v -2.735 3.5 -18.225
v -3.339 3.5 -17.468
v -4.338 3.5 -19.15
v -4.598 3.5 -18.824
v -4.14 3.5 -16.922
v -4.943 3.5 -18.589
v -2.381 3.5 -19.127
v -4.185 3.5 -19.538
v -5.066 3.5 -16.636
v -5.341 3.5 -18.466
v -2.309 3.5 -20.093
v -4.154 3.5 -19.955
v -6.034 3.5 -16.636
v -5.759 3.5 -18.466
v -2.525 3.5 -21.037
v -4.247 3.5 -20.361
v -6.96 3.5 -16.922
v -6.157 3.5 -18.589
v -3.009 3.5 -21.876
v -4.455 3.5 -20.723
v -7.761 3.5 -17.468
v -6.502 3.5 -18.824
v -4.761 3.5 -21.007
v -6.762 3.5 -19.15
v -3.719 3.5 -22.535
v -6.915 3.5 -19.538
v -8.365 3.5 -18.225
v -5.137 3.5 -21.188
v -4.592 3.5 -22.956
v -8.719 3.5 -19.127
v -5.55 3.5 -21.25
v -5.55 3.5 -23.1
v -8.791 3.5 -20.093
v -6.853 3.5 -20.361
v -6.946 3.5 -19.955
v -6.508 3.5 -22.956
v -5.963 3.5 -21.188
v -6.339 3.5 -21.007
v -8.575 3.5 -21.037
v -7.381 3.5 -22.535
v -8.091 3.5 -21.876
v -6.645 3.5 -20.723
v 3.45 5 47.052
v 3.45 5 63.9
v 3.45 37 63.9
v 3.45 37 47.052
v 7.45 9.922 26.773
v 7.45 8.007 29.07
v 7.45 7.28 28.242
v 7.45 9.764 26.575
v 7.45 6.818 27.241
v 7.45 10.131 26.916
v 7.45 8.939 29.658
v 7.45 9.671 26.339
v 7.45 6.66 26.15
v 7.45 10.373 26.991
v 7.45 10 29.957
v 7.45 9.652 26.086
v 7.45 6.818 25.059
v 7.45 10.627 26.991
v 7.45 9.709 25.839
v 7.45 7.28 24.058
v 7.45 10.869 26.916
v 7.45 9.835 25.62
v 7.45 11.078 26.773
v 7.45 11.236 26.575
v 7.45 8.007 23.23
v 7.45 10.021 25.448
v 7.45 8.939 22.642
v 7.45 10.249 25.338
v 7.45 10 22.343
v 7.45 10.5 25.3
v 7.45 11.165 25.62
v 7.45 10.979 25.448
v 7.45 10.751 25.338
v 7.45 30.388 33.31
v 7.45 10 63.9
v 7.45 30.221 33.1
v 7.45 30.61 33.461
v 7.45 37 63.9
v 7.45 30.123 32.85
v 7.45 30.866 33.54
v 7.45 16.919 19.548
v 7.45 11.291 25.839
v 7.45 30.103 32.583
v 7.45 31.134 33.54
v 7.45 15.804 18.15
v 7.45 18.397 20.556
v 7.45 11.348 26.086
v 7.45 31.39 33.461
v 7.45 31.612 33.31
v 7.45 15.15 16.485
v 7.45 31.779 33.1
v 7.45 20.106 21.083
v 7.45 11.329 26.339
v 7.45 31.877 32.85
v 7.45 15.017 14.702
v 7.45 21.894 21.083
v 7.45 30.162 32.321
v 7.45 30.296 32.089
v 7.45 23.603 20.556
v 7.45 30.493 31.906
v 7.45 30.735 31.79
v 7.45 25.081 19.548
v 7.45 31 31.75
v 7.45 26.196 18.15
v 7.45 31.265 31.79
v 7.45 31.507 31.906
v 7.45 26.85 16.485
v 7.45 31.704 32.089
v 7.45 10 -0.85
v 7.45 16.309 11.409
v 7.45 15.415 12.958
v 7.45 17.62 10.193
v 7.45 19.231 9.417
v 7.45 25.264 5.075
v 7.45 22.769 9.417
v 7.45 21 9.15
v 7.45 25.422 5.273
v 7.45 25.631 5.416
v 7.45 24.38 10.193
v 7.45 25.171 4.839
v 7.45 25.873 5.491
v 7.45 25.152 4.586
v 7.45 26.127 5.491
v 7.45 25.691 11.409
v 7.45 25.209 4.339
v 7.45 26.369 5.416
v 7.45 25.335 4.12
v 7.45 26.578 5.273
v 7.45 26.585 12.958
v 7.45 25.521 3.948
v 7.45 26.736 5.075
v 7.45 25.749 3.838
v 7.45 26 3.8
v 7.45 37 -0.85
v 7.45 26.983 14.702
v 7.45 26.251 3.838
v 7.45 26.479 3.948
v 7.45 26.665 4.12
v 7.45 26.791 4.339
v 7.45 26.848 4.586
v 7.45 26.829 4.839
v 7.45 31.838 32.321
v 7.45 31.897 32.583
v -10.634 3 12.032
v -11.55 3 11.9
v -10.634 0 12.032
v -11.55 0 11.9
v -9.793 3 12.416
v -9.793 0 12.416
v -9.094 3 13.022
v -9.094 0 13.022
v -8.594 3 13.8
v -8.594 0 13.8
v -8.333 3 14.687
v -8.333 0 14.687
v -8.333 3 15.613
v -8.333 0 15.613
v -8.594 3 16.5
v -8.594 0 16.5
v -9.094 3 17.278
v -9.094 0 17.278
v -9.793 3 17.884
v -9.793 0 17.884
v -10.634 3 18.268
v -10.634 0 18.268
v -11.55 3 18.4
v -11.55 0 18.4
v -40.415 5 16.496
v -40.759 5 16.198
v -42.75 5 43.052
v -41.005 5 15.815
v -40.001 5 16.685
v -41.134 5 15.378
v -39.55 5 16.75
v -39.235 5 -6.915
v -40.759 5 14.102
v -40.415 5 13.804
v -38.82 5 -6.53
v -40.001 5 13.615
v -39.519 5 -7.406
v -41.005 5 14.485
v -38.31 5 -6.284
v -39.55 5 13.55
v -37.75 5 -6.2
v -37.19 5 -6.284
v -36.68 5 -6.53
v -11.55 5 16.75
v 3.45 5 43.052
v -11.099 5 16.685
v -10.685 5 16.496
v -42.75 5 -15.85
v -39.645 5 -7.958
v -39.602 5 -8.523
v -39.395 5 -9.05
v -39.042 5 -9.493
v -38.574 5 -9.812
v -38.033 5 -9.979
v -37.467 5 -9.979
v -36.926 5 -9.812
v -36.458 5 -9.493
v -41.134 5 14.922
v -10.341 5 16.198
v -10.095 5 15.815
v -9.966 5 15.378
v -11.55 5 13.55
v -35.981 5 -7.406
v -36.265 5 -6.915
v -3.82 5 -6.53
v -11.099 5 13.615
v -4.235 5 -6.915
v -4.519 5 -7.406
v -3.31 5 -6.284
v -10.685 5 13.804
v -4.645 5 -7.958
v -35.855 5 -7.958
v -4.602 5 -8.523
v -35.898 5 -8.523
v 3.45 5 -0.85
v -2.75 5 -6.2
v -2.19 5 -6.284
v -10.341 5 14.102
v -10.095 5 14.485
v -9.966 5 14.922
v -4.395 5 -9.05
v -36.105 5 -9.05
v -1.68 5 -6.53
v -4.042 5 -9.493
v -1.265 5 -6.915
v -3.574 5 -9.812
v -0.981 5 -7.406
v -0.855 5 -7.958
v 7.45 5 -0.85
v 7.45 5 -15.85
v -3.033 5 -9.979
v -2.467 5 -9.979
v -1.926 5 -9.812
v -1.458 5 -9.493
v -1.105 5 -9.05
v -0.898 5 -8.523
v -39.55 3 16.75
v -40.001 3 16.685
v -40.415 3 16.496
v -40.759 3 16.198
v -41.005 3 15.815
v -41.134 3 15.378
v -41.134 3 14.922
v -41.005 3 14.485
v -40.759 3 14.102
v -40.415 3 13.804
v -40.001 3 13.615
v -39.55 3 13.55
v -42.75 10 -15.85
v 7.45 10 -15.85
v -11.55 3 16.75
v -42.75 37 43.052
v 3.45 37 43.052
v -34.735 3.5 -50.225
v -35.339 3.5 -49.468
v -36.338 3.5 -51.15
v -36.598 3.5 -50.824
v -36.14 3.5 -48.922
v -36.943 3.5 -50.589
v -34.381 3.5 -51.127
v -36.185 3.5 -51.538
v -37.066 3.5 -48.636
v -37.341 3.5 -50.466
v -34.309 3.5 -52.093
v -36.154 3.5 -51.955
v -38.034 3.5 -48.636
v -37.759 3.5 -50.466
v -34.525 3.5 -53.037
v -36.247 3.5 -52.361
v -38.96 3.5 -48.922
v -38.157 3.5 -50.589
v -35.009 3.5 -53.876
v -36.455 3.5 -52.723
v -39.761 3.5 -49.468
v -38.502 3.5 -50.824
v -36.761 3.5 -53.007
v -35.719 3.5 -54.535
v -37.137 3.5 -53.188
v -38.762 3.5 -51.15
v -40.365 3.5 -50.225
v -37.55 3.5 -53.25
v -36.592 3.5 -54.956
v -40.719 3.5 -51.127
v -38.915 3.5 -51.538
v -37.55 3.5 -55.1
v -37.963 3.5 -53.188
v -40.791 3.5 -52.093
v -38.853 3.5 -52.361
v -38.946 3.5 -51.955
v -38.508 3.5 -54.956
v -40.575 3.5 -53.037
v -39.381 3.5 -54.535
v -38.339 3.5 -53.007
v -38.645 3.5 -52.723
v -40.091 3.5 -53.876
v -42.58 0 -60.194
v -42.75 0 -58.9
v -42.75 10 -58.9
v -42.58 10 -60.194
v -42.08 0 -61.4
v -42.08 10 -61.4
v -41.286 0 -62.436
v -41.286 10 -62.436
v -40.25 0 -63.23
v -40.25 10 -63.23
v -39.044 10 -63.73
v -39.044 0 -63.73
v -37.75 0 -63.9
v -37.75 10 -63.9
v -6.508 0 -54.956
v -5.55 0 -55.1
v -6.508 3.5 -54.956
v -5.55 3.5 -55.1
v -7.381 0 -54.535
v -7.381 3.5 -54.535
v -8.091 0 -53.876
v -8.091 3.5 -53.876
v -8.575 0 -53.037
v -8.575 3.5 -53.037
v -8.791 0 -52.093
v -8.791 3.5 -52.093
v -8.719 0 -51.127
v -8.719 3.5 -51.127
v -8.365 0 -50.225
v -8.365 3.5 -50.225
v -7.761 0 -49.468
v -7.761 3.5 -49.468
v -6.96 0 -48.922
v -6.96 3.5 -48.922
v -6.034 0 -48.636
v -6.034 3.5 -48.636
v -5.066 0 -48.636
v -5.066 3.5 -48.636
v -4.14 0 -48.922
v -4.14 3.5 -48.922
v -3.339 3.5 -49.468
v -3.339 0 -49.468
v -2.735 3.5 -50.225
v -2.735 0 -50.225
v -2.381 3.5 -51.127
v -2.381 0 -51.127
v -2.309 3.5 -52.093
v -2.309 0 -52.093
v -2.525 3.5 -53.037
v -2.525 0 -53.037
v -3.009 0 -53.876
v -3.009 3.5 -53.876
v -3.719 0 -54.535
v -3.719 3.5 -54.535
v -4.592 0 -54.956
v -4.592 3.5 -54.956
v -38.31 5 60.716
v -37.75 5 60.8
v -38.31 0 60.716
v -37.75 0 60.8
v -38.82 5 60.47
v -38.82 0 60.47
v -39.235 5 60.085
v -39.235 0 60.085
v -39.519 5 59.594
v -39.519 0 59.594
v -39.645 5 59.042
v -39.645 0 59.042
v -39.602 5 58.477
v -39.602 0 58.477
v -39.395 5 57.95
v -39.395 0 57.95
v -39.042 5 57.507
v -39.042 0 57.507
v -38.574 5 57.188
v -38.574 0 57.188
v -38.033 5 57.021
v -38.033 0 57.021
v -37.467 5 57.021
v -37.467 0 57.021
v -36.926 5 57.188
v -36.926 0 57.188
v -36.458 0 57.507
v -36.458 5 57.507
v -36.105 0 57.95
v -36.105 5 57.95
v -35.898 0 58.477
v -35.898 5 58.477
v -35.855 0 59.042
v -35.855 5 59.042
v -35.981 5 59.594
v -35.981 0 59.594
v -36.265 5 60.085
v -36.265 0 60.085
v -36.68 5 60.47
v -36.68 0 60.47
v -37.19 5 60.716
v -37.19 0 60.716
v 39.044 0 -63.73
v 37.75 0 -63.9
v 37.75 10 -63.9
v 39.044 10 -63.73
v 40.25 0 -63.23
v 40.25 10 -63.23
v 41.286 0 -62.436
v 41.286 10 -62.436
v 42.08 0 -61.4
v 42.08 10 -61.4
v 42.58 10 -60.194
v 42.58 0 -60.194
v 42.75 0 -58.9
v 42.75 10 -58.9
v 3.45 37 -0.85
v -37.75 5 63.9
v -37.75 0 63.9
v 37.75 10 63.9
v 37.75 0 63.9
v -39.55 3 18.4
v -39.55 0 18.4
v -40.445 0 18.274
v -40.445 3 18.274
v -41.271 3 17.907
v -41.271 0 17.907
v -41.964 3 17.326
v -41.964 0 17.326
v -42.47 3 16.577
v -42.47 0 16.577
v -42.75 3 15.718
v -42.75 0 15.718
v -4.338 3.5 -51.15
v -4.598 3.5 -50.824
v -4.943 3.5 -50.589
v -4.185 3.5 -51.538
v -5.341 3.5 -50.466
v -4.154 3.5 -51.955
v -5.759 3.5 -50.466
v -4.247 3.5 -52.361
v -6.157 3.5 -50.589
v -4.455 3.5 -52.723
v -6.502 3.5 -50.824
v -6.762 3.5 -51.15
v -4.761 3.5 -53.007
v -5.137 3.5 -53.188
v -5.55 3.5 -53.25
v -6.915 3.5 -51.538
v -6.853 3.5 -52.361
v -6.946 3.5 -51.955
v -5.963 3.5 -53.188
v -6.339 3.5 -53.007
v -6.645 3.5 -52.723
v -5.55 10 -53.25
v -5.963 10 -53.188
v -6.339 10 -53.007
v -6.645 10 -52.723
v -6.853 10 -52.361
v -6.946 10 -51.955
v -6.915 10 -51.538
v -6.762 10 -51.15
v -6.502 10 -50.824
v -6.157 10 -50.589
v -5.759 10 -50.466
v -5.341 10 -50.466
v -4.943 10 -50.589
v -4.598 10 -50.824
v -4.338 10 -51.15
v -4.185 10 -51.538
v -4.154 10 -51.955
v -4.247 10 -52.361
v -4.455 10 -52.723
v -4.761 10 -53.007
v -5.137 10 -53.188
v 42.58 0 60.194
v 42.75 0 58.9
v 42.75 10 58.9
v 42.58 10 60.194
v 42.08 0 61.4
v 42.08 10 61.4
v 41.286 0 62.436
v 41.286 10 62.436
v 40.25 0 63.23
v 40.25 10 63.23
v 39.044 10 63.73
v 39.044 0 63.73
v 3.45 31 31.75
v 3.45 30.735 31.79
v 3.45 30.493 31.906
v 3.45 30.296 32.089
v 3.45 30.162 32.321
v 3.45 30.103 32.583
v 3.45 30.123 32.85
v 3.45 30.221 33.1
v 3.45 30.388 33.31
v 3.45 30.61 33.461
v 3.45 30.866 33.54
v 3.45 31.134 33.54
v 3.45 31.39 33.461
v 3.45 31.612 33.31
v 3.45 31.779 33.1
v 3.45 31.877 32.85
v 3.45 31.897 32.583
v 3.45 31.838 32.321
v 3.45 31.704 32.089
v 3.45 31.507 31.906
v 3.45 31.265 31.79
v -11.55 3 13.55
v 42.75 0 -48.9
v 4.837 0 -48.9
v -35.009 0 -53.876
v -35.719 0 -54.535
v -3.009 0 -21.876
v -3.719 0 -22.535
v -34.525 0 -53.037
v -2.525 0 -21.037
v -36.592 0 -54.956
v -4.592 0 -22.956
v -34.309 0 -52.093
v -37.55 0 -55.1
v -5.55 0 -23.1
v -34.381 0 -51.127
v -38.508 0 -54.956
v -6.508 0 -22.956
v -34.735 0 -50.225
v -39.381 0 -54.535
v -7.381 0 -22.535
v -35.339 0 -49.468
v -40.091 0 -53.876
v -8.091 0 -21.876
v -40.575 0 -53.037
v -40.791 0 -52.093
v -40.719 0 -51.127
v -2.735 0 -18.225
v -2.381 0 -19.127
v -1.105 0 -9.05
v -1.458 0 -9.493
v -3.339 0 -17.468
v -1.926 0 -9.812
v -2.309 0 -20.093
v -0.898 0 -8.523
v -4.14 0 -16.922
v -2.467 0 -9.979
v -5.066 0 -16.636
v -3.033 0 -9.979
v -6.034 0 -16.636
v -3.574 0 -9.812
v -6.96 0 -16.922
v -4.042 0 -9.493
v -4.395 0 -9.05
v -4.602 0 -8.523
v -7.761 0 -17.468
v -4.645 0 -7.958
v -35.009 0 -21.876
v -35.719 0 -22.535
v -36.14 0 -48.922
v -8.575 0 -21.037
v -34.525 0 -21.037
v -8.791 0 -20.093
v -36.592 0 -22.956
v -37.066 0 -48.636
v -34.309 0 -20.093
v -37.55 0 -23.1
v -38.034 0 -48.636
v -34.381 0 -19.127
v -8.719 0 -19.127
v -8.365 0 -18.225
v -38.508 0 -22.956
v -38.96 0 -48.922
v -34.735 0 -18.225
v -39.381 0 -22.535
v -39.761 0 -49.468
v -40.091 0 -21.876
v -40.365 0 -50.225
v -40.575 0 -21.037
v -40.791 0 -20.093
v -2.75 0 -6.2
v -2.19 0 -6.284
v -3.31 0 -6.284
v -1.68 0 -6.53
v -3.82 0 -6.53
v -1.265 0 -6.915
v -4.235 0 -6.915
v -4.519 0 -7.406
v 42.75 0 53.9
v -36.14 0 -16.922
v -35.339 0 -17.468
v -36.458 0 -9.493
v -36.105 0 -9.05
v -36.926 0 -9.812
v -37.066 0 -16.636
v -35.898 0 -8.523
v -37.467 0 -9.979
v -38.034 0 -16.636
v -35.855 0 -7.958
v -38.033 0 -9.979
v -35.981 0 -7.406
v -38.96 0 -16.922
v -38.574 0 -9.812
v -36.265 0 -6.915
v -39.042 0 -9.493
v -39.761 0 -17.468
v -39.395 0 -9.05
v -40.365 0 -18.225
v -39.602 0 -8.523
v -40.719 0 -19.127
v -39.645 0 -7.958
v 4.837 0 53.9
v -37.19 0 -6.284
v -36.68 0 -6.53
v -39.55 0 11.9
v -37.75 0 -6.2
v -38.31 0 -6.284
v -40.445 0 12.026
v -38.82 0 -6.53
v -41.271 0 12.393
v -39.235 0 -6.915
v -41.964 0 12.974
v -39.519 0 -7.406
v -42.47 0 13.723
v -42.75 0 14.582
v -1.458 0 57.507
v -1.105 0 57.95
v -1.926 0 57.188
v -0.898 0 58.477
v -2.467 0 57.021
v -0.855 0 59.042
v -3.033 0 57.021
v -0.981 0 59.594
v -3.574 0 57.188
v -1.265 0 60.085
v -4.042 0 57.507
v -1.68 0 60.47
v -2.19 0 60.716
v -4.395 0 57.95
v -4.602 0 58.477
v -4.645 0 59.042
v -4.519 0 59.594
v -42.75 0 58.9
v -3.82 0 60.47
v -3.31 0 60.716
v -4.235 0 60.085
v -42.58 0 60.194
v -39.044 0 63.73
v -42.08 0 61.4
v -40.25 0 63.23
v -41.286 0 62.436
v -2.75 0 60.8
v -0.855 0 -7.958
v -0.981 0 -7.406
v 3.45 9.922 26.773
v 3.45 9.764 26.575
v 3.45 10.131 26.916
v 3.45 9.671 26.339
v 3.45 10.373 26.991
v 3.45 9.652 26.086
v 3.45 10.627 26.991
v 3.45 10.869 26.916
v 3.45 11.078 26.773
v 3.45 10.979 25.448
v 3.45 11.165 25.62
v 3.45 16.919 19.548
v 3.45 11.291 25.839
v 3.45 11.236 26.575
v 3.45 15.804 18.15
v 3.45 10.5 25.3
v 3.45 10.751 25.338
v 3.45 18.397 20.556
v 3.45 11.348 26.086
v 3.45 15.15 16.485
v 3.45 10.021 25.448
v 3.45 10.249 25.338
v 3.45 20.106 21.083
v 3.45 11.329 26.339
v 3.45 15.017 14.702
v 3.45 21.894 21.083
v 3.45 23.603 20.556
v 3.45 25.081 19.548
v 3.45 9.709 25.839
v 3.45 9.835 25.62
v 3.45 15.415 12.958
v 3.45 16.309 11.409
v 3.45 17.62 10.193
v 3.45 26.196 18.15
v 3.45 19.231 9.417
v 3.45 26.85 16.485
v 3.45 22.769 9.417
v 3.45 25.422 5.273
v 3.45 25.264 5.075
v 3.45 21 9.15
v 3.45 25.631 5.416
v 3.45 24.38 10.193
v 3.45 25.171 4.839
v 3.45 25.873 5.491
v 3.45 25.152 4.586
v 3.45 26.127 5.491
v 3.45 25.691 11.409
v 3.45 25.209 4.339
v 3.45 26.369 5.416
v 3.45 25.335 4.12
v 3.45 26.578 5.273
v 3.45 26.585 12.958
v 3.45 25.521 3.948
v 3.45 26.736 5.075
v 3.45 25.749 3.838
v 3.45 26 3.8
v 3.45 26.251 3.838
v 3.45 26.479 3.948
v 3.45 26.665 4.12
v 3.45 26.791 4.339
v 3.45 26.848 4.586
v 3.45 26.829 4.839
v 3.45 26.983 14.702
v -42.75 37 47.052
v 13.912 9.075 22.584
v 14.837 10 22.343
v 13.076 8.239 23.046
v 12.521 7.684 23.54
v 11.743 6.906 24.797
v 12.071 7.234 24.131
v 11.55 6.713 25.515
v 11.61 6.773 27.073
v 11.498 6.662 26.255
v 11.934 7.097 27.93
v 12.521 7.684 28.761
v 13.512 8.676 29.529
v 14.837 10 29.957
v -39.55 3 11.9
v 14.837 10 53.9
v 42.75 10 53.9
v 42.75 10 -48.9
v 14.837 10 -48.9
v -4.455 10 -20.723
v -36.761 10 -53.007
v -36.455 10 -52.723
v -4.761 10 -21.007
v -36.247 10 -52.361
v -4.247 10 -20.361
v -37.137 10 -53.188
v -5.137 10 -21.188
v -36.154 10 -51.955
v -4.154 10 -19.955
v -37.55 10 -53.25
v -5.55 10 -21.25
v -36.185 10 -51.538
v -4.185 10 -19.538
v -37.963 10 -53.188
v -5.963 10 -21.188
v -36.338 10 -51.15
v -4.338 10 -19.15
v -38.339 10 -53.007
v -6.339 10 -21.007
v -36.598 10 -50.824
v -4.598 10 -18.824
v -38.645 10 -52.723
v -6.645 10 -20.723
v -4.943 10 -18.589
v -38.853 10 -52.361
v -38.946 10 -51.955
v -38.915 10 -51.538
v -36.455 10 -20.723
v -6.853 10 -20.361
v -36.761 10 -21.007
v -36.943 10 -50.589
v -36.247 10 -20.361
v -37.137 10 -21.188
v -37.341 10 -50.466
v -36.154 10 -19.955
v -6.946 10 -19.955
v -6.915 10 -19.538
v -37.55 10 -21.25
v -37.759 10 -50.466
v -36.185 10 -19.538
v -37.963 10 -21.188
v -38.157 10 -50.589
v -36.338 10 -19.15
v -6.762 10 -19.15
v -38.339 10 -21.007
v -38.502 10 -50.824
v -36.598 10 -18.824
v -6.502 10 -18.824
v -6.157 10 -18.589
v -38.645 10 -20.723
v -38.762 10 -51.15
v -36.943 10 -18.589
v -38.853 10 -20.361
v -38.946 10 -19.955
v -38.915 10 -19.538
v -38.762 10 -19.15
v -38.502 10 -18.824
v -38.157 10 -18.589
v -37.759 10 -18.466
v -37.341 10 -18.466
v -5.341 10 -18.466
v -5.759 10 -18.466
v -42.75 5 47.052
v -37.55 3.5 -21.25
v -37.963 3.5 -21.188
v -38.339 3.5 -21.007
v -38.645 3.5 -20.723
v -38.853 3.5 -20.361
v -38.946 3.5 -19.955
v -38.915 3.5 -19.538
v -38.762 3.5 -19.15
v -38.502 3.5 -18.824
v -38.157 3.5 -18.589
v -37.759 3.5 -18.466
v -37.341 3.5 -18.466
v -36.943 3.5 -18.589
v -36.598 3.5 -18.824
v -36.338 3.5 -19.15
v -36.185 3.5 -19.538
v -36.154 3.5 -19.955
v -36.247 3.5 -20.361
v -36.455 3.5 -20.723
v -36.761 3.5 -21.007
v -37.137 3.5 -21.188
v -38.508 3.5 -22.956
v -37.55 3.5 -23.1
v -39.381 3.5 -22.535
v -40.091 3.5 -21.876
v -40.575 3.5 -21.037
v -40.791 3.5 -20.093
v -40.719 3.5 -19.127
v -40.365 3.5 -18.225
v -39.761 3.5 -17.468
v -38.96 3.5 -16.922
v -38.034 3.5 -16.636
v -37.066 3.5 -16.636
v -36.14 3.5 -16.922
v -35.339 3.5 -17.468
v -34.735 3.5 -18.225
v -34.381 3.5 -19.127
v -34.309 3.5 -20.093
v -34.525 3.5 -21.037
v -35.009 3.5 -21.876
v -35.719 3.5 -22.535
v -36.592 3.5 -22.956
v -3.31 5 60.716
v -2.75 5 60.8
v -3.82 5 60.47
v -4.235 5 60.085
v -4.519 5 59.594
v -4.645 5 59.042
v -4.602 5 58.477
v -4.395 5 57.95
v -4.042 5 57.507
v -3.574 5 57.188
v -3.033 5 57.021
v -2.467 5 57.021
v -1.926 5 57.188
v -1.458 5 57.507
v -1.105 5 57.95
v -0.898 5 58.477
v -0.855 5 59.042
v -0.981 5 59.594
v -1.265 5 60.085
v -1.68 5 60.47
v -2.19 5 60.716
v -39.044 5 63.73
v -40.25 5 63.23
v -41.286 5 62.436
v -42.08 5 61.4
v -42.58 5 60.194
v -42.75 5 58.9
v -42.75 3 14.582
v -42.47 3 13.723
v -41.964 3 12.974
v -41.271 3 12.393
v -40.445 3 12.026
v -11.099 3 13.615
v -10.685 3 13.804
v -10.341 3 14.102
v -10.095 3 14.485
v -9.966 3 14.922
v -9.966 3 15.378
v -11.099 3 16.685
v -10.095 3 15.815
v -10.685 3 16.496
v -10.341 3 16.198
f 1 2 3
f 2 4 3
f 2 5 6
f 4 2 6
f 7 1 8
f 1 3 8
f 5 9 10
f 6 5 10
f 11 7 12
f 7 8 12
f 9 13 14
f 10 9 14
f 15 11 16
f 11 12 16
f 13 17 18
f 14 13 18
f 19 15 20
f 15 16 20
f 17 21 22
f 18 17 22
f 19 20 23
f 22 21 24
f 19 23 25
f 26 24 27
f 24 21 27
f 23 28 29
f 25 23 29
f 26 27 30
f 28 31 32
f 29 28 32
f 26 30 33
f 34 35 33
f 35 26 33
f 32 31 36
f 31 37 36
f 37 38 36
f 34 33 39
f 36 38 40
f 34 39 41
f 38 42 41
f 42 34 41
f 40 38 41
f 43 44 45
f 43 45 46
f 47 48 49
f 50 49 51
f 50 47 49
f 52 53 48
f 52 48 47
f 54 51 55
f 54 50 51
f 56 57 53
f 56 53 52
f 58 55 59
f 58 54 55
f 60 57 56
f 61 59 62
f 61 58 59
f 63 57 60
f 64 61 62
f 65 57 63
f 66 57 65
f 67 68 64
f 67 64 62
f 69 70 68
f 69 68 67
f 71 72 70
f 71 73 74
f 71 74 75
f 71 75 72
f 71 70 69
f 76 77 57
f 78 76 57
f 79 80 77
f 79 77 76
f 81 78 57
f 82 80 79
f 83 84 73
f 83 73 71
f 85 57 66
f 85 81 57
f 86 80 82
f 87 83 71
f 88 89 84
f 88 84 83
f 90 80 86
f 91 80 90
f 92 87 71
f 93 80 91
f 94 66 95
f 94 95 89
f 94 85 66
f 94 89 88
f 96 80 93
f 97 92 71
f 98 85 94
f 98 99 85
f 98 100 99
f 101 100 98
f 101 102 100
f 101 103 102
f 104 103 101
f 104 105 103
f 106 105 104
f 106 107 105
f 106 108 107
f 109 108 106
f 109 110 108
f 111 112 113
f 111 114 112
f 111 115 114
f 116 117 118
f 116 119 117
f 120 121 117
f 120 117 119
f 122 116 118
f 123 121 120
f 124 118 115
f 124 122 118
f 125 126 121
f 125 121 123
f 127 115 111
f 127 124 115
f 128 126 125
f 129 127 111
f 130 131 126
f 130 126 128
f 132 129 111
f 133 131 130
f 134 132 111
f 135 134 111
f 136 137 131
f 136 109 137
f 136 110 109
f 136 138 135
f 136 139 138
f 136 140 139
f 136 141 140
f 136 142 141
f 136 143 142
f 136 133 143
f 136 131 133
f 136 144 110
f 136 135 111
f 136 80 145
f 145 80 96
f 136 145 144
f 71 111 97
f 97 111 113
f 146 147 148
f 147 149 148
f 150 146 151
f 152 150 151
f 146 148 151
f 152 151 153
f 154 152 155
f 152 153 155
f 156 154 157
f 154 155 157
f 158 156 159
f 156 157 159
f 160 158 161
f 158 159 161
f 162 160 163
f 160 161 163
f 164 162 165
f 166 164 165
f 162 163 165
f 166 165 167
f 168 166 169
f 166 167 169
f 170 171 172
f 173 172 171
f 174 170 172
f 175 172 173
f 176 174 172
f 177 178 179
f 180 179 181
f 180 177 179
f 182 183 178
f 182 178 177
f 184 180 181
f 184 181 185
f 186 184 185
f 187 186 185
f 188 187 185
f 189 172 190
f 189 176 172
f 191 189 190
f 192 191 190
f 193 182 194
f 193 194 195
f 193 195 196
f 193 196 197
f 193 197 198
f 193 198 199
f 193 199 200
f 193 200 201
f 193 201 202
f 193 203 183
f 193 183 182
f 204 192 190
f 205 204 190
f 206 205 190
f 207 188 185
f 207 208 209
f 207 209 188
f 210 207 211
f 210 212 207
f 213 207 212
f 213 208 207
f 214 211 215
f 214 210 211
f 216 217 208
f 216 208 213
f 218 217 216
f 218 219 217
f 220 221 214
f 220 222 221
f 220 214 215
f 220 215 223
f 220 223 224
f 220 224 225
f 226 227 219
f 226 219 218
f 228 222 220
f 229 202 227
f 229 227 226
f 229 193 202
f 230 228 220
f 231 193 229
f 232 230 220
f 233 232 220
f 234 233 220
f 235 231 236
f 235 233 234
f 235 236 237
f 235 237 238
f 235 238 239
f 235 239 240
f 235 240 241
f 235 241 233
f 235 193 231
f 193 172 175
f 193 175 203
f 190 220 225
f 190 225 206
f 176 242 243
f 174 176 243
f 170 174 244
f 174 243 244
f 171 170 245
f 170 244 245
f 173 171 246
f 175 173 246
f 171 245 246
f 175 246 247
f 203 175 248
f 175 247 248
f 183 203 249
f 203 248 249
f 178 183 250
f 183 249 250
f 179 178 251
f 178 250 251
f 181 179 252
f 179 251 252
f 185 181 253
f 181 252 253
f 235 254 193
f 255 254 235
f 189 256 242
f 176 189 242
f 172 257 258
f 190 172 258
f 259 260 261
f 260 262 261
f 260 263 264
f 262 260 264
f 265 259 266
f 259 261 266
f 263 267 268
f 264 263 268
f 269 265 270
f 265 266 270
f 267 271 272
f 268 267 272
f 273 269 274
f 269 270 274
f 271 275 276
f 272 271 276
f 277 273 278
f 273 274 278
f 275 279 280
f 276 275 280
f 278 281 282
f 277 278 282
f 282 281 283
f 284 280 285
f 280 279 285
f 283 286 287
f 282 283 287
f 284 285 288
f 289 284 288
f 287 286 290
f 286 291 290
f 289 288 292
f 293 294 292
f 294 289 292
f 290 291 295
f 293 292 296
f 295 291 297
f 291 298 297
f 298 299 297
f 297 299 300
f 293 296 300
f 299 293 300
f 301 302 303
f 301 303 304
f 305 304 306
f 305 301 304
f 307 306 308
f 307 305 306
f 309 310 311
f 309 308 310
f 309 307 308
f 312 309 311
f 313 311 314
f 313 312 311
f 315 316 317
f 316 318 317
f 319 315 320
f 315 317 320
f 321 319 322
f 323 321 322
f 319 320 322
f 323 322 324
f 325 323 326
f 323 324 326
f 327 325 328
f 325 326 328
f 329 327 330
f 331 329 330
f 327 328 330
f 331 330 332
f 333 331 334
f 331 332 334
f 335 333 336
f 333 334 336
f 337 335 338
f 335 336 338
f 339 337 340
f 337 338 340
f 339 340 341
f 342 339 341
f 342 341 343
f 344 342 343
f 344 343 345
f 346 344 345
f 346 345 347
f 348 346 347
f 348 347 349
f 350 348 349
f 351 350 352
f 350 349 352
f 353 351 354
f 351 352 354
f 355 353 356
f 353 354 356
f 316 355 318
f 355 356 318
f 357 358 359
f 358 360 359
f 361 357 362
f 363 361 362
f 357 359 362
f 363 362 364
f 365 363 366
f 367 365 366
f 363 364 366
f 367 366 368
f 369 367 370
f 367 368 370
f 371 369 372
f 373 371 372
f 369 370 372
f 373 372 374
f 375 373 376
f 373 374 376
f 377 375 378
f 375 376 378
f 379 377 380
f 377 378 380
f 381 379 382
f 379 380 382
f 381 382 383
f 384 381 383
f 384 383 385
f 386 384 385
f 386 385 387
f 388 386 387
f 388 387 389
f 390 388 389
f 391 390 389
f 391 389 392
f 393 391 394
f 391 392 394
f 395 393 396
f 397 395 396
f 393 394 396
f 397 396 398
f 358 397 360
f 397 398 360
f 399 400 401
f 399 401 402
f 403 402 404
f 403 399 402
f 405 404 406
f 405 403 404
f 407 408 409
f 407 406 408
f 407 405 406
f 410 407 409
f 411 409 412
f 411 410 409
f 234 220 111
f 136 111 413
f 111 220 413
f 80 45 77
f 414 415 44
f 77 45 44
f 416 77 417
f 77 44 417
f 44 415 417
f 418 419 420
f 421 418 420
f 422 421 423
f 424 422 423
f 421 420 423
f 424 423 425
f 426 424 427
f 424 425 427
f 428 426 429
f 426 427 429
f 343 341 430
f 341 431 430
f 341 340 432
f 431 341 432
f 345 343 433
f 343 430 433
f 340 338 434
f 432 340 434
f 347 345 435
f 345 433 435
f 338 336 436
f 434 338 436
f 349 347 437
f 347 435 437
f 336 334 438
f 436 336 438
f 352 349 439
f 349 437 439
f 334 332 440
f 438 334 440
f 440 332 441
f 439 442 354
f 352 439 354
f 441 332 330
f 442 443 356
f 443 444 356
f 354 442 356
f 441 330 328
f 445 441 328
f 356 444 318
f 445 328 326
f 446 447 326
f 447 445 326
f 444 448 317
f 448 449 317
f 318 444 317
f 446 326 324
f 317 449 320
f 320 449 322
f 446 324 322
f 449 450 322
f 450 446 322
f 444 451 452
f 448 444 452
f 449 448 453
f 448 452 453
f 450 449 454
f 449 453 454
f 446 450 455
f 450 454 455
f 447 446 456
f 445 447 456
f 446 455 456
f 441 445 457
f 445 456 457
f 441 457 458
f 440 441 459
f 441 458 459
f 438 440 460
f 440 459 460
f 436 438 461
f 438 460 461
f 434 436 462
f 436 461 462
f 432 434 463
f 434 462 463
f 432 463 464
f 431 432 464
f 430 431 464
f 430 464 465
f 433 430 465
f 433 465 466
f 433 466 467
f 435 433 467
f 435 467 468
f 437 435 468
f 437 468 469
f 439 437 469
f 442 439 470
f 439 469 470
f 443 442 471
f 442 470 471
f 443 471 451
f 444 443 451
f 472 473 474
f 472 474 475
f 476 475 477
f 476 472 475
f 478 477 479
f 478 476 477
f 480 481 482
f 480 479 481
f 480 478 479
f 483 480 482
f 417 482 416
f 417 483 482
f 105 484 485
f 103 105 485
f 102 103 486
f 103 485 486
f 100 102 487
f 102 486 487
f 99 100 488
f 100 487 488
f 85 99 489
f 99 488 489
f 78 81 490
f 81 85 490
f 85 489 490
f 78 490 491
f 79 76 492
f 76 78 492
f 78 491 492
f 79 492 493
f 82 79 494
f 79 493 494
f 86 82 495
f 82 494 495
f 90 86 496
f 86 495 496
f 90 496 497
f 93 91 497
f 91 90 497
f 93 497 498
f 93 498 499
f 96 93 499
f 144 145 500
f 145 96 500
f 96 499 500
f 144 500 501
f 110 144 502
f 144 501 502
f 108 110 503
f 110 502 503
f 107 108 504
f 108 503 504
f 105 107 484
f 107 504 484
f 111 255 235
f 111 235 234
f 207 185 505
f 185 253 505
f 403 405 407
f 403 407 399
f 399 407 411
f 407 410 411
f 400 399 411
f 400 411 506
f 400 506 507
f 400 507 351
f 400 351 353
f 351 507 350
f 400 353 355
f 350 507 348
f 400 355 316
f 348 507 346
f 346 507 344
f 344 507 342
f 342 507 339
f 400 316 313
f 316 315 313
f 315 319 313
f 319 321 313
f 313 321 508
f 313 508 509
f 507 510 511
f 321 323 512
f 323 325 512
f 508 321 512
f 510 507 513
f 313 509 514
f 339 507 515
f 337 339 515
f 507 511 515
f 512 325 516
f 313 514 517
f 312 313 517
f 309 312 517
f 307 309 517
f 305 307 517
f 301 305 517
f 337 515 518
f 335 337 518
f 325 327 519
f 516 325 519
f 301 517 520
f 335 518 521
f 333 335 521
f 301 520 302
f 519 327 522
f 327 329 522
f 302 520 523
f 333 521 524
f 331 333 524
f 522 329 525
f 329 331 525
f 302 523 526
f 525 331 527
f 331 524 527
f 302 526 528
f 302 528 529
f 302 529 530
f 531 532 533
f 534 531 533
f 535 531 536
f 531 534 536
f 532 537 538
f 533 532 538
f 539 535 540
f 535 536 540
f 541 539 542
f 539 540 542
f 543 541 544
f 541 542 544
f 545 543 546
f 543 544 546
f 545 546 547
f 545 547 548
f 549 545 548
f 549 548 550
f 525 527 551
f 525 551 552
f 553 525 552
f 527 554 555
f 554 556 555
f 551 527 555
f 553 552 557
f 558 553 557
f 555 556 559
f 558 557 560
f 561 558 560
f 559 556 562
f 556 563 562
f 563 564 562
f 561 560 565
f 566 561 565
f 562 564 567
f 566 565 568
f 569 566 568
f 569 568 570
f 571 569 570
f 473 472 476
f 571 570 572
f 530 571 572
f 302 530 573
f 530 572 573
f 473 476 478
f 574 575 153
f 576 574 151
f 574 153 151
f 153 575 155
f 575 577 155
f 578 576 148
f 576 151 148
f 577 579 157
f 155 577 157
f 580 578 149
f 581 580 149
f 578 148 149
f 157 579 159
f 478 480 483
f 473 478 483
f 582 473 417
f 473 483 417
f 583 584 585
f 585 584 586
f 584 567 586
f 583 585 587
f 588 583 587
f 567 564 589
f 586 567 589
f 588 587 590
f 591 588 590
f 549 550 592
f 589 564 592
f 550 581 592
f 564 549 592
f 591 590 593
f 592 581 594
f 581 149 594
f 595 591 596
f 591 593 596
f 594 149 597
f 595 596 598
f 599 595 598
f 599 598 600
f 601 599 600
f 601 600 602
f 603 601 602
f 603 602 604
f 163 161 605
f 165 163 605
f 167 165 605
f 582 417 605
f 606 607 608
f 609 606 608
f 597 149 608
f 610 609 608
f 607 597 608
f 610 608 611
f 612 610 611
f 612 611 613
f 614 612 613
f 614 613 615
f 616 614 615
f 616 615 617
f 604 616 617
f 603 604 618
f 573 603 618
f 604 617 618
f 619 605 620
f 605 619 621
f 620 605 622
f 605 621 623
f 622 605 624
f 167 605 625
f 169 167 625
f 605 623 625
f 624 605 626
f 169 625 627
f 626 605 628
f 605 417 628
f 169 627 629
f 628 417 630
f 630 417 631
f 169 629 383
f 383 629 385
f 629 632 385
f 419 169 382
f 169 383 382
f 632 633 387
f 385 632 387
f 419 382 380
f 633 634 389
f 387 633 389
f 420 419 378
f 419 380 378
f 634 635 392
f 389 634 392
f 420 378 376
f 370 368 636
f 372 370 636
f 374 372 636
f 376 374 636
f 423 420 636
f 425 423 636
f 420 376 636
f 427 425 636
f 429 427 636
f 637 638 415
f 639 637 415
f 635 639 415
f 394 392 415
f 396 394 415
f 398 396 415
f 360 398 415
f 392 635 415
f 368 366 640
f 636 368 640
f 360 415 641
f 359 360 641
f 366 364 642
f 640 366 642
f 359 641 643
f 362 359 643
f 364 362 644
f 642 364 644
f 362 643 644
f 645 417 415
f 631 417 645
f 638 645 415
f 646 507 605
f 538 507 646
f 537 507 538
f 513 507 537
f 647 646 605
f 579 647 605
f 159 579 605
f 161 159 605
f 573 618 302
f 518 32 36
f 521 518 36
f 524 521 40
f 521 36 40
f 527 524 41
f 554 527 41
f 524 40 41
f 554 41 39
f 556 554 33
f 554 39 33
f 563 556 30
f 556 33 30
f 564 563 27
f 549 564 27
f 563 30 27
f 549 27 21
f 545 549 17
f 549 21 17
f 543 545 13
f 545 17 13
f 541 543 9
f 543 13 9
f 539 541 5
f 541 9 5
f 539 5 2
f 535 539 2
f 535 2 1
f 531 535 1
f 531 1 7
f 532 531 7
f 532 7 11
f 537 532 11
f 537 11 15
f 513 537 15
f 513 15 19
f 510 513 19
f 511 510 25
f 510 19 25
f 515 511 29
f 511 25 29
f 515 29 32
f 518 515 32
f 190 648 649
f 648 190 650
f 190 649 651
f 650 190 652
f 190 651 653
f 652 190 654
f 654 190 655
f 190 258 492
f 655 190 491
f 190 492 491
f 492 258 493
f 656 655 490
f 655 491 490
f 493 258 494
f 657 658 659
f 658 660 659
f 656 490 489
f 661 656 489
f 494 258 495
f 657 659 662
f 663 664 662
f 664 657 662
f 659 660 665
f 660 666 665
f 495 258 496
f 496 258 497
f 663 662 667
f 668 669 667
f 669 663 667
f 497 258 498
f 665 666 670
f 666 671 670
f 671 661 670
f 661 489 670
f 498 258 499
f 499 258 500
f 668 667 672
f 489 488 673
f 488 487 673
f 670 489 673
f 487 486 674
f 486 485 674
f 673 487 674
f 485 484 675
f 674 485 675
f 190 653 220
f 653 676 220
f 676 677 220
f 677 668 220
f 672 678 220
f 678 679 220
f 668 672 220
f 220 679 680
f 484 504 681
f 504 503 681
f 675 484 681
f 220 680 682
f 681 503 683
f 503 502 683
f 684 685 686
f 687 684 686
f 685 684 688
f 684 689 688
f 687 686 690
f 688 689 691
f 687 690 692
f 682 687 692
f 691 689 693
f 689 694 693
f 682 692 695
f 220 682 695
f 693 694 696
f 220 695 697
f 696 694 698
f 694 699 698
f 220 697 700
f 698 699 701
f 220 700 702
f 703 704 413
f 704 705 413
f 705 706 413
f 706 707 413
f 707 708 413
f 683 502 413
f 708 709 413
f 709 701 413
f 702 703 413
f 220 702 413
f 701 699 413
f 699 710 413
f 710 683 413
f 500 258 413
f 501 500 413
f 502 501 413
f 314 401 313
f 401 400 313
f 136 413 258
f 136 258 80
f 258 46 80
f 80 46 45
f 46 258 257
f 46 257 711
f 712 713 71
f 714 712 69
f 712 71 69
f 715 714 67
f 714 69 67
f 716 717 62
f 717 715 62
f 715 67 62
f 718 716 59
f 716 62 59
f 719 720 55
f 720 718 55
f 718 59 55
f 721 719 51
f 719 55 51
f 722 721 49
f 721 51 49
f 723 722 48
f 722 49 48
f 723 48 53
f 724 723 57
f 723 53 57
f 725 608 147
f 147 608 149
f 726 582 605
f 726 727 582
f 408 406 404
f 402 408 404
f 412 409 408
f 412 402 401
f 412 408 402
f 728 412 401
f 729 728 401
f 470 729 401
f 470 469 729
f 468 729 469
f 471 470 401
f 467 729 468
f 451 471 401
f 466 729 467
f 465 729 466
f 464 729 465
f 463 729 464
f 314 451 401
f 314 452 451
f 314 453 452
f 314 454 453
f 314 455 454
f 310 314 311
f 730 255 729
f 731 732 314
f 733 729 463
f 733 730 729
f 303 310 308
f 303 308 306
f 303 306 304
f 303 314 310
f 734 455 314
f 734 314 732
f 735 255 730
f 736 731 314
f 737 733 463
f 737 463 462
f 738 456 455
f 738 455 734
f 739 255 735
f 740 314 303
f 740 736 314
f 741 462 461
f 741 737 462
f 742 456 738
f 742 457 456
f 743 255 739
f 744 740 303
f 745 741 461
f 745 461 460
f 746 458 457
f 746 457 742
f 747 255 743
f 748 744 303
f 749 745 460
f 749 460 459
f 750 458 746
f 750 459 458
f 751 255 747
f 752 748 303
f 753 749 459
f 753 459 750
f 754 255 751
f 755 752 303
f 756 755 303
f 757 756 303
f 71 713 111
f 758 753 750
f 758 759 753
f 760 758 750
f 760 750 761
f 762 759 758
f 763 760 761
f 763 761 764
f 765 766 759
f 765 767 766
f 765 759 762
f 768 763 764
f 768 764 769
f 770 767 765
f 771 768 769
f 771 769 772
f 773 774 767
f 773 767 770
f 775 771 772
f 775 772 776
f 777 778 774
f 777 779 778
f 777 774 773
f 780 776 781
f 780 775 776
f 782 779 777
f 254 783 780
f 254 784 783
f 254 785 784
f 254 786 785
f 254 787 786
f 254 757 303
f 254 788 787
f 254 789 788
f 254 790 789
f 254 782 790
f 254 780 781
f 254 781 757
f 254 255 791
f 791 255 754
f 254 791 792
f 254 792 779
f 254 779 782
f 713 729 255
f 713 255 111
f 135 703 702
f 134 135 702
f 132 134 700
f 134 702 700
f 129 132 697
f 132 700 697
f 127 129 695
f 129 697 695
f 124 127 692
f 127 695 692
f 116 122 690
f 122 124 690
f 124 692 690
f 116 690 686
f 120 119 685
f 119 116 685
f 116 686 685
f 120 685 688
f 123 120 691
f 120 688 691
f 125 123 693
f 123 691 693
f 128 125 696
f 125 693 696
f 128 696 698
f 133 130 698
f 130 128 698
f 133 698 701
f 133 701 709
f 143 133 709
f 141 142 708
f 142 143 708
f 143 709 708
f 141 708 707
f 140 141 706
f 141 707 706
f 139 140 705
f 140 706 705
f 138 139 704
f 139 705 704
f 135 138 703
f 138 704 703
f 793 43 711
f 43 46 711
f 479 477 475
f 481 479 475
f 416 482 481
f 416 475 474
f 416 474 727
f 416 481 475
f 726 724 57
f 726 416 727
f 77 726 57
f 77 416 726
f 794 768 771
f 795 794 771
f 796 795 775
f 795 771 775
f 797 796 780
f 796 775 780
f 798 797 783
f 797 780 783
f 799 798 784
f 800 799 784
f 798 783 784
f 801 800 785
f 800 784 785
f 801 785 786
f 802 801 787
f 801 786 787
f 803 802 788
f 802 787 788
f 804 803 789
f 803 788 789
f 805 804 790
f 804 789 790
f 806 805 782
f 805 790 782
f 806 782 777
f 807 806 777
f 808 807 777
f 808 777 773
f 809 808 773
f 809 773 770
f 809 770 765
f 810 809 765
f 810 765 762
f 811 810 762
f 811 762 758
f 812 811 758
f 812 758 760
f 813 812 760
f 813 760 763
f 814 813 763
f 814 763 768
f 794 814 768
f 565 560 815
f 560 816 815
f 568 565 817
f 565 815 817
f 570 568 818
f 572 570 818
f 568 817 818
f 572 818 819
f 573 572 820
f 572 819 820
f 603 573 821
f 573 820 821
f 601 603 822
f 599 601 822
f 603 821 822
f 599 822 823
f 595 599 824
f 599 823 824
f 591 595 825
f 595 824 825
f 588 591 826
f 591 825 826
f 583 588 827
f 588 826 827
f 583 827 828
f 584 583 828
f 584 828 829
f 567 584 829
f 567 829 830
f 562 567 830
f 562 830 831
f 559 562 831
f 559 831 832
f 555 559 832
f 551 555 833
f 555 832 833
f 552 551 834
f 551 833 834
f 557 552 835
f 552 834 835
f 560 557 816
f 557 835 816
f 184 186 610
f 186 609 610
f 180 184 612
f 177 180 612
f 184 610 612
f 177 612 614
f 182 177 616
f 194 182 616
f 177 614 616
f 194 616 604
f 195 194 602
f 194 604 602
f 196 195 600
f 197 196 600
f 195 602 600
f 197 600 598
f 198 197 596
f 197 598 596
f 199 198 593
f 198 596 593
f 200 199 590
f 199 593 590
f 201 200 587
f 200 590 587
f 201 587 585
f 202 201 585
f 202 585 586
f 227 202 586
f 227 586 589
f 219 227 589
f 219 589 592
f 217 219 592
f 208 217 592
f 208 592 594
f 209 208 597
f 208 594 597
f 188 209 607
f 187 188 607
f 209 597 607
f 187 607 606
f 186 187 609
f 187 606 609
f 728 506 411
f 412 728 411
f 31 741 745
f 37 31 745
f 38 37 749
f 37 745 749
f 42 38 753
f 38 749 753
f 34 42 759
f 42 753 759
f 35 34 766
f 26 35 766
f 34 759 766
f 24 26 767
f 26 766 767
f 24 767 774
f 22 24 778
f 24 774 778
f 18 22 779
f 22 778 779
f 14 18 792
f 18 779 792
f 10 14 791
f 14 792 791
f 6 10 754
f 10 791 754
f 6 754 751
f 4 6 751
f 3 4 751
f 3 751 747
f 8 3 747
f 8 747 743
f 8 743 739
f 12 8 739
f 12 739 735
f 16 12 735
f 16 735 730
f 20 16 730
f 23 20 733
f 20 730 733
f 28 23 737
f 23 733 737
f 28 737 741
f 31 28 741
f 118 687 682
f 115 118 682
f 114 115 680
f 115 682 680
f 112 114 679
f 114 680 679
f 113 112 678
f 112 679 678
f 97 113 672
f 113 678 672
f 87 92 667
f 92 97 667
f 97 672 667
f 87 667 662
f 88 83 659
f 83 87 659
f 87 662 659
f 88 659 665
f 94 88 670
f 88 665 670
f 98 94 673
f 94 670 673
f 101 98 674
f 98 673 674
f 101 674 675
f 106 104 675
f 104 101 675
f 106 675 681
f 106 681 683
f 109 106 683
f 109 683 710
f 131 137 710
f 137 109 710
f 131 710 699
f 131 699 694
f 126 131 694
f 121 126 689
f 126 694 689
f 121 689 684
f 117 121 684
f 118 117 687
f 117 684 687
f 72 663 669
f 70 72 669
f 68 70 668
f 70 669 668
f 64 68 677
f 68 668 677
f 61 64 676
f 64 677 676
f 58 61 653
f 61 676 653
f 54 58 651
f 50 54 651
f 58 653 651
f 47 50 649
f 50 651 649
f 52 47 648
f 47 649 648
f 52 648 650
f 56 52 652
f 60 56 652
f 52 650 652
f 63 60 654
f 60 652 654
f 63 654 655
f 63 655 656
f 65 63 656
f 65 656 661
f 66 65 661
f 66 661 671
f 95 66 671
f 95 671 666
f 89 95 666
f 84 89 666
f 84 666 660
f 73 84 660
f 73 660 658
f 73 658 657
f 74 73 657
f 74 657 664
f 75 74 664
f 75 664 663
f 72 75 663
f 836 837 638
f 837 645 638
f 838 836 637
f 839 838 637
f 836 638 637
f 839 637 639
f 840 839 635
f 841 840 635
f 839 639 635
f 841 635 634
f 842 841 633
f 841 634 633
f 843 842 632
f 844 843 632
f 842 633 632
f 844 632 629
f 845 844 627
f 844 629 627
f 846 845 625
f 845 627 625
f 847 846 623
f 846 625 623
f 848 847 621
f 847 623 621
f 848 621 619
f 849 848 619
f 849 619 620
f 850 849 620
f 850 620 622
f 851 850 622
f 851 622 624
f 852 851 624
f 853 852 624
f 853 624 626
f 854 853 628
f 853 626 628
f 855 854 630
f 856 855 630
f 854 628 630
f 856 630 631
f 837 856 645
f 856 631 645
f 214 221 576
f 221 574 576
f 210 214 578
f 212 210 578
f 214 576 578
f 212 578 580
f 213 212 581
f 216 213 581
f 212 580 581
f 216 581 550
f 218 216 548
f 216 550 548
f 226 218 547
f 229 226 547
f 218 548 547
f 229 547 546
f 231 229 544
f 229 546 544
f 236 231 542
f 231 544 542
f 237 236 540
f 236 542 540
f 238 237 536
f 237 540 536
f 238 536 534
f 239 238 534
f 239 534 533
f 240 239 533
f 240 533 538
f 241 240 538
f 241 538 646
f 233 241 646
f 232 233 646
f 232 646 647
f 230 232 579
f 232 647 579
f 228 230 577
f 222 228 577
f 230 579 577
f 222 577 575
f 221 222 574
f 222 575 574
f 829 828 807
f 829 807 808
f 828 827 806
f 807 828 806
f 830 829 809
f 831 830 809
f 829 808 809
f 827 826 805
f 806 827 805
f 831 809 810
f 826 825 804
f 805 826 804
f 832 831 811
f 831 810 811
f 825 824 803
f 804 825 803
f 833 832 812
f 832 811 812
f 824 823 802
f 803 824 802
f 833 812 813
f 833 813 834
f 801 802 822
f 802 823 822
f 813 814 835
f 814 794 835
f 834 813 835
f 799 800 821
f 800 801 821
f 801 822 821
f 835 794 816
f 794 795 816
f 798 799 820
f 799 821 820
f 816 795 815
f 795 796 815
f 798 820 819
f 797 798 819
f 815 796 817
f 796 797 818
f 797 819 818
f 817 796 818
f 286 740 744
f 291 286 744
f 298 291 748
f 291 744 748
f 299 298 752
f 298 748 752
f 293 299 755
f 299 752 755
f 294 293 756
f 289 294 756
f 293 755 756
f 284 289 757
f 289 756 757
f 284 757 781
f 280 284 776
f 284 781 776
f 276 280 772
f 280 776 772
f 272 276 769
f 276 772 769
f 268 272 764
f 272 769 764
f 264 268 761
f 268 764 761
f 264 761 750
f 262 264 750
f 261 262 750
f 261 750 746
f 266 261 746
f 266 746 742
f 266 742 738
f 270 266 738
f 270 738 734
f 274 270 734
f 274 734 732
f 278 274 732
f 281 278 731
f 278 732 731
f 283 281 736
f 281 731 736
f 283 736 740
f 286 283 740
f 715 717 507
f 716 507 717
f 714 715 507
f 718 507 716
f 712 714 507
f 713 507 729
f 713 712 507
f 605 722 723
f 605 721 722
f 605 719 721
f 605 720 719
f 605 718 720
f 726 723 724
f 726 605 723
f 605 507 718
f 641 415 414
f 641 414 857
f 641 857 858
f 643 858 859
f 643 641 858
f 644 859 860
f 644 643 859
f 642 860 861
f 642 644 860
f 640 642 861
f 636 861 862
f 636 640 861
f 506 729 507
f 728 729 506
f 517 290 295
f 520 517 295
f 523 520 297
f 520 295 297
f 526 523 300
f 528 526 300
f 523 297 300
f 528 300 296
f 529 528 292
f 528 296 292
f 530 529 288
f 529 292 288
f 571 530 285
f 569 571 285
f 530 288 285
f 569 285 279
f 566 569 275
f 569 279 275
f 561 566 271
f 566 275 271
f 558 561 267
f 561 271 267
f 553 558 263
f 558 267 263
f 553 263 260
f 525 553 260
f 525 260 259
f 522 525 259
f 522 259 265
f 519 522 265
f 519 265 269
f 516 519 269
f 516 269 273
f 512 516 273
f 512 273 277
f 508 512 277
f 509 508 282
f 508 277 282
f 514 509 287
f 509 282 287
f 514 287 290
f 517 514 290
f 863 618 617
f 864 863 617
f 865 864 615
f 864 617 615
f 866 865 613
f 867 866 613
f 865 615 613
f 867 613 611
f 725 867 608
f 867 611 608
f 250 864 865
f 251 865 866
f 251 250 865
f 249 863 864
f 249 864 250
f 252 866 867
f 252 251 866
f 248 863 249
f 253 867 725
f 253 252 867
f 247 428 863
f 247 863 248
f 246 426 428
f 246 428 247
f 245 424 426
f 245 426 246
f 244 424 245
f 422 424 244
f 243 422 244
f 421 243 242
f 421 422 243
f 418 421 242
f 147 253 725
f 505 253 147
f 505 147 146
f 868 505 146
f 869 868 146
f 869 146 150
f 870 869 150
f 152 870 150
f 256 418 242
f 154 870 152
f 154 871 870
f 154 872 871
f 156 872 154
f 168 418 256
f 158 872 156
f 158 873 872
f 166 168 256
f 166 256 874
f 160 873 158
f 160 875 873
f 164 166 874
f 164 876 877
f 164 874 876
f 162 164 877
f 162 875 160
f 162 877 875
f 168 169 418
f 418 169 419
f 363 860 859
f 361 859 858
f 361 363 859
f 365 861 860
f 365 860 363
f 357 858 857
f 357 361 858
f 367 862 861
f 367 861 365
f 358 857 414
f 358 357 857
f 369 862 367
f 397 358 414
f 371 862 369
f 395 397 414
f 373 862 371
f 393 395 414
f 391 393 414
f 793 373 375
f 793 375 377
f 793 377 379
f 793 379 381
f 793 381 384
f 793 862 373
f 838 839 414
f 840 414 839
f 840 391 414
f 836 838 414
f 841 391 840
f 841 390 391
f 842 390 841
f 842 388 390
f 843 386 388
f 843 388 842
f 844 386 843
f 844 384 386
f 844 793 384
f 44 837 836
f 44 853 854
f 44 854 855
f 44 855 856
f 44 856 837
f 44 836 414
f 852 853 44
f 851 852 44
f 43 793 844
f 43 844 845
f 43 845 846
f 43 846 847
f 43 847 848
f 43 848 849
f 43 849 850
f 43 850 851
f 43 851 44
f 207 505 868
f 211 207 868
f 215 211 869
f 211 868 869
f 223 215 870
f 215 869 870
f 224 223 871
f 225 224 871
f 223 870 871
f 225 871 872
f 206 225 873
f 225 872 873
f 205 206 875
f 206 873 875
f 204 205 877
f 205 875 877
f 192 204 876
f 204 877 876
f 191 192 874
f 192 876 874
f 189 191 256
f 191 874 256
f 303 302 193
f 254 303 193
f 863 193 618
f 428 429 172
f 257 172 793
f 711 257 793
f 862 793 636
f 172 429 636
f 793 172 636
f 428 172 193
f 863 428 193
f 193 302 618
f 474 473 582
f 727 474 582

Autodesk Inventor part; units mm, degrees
ref_plane "Arbeitsebene4" through (-41.55, 10, -74.35) normal (0, -1, 0) x (1, 0, 0)
sketch "Skizze1" plane through (0, 0, 0) normal (0, 1, 0) x (-1, 0, 0)
  line L0 (-37.75, -63.9) -> (37.75, -63.9)
  line L1 (42.75, -58.9) -> (42.75, 58.9)
  line L2 (37.75, 63.9) -> (-37.75, 63.9)
  line L3 (-42.75, 58.9) -> (-42.75, -58.9)
  line L4 (-42.75, -63.9) -> (42.75, 63.9) construction
  line L5 (42.75, -63.9) -> (-42.75, 63.9) construction
  arc A0 (42.75, 58.9) -> (37.75, 63.9) centre (37.75, 58.9) ccw
  arc A1 (-37.75, 63.9) -> (-42.75, 58.9) centre (-37.75, 58.9) ccw
  arc A2 (-42.75, -58.9) -> (-37.75, -63.9) centre (-37.75, -58.9) ccw
  arc A3 (37.75, -63.9) -> (42.75, -58.9) centre (37.75, -58.9) ccw
  point P0 (0, 0)
  dimension "d0" = 85.5
  dimension "d1" = 127.8
  dimension "d2" = 5
extrude "Extrusion1" add sketch "Skizze1" along normal up to surface (10 mm away)
ref_plane "Arbeitsebene1" through (37.75, 0, 0) normal (0, 0, -1) x (-1, 0, 0)
ref_plane "Arbeitsebene2" through (0, 0, 58.9) normal (1, 0, 0) x (0, 0, -1)
sketch "Skizze10" plane through (0, 0, 0) normal (0, -1, 0) x (1, 0, 0)
  circle A0 centre (-37.55, -51.85) radius 1.75 projected
  circle A1 centre (-37.55, -19.85) radius 1.75 projected
  circle A2 centre (-5.55, -51.85) radius 1.75 projected
  circle A3 centre (-5.55, -19.85) radius 1.75 projected
  circle A4 centre (-37.55, -51.85) radius 1.4
  point P0 (0, 0)
  dimension "d37" = 2.8
hole "Bohrung2" at (-37.55, 0, -51.85) at (-37.55, 0, -19.85) at (-5.55, 0, -19.85) at (-5.55, 0, -51.85) direction (0, 1, 0) diameter 2.8 end through all counterbore diameter 6.5 counterbore depth 3.5
sketch "Skizze11" plane through (-37.75, 10, -63.9) normal (0, 1, 0) x (1, 0, 0)
  line L0 (-6.8, -63.05) -> (41.2, -63.05) projected
  line L1 (-6.8, -95.05) -> (41.2, -95.05) projected
  line L2 (-3.8, -48.05) -> (36.2, -48.05) projected
  line L3 (-5, -5) -> (-5, -122.8) projected
  line L4 (0, -127.8) -> (75.5, -127.8) projected
  line L5 (-5, -48.05) -> (45.2, -48.05)
  line L6 (45.2, -48.05) -> (45.2, -127.8)
  line L7 (45.2, -127.8) -> (-5, -127.8)
  line L8 (-5, -127.8) -> (-5, -48.05)
  line L9 (45.2, -108.7984) -> (45.2, -60.5539)
  line L10 (80.5, -82.3) -> (60.5, -82.3) construction
  line L11 (60.5, -82.3) -> (60.5, -82.05) construction
  line L12 (60.5, -82.05) -> (60.5, -81.8) construction
  line L13 (60.5, -81.8) -> (60.5, -81.55) construction
  line L14 (60.5, -81.55) -> (60.5, -81.3) construction
  line L15 (60.5, -81.3) -> (60.5, -81.05) construction
  line L16 (60.5, -81.05) -> (60.5, -80.8) construction
  line L17 (60.5, -80.8) -> (60.5, -80.55) construction
  line L18 (60.5, -80.55) -> (60.5, -80.3) construction
  line L19 (60.5, -80.3) -> (60.5, -80.05) construction
  line L20 (60.5, -80.05) -> (60.5, -79.8) construction
  line L21 (60.5, -79.8) -> (60.5, -79.55) construction
  line L22 (60.5, -79.55) -> (60.5, -79.3) construction
  line L23 (60.5, -79.3) -> (60.5, -79.05) construction
  line L24 (60.5, -79.05) -> (60.5, -78.8) construction
  line L25 (60.5, -78.8) -> (60.5, -78.55) construction
  line L26 (60.5, -78.55) -> (60.5, -78.3) construction
  line L27 (60.5, -78.3) -> (60.5, -78.05) construction
  line L28 (60.5, -78.05) -> (60.5, -77.8) construction
  line L29 (60.5, -77.8) -> (60.5, -77.55) construction
  line L30 (60.5, -77.55) -> (60.5, -77.3) construction
  line L31 (60.5, -77.3) -> (80.5, -77.3) construction
  line L32 (80.5, -77.3) -> (80.5, -41.8) construction
  line L33 (80.5, -41.8) -> (54.7, -41.8) construction
  line L34 (54.7, -41.8) -> (54.7, -117.8) construction
  line L35 (54.7, -117.8) -> (80.5, -117.8) construction
  line L36 (80.5, -117.8) -> (80.5, -82.3) construction
  point P0 (37.75, -63.9)
  dimension "d45" = 0
ref_plane "Arbeitsebene5" through (-44.55, 5, -0.85) normal (0, -1, 0) x (1, 0, 0)
extrude "Extrusion9" cut sketch "Skizze11" against normal up to surface (5 mm away)
sketch "Skizze12" plane through (0, 0, 0) normal (0, -1, 0) x (1, 0, 0)
  circle A0 centre (-39.55, 15.15) radius 1.4 projected
  circle A1 centre (-11.55, 15.15) radius 1.4 projected
  line L0 (-11.55, 15.15) -> (-39.55, 15.15) construction
  line L1 (-11.55, 16.75) -> (-39.55, 16.75)
  line L2 (-39.55, 13.55) -> (-11.55, 13.55)
  arc A2 (-11.55, 13.55) -> (-11.55, 16.75) centre (-11.55, 15.15) ccw
  arc A3 (-39.55, 16.75) -> (-39.55, 13.55) centre (-39.55, 15.15) ccw
  point P0 (0, 0)
  point P1 (-25.55, 15.15)
  dimension "d48" = 3.2
extrude "Extrusion10" cut sketch "Skizze12" against normal blind 10 contours A0 | A1 | A2 L2 A3 L1
sketch "Skizze13" plane through (0, 0, 0) normal (0, -1, 0) x (1, 0, 0)
  line L0 (-44.55, 31.15) -> (3.45, 31.15) projected
  line L1 (-11.55, 13.55) -> (-39.55, 13.55) projected
  arc A0 (-39.55, 16.75) -> (-39.55, 13.55) centre (-39.55, 15.15) ccw projected
  line L2 (-39.55, 16.75) -> (-11.55, 16.75) projected
  arc A1 (-11.55, 13.55) -> (-11.55, 16.75) centre (-11.55, 15.15) ccw projected
  arc A2 (-42.75, -58.9) -> (-37.75, -63.9) centre (-37.75, -58.9) ccw projected
  line L3 (37.75, -63.9) -> (-37.75, -63.9) projected
  arc A3 (37.75, -63.9) -> (42.75, -58.9) centre (37.75, -58.9) ccw projected
  line L4 (42.75, 58.9) -> (42.75, -58.9) projected
  arc A4 (42.75, 58.9) -> (37.75, 63.9) centre (37.75, 58.9) ccw projected
  line L5 (-37.75, 63.9) -> (37.75, 63.9) projected
  arc A5 (-37.75, 63.9) -> (-42.75, 58.9) centre (-37.75, 58.9) ccw projected
  line L6 (-42.75, -58.9) -> (-42.75, 58.9) projected
  line L7 (-11.55, 18.4) -> (-39.55, 18.4)
  arc A6 (-39.55, 18.4) -> (-39.55, 11.9) centre (-39.55, 15.15) ccw
  line L8 (-39.55, 11.9) -> (-11.55, 11.9)
  arc A7 (-11.55, 11.9) -> (-11.55, 18.4) centre (-11.55, 15.15) ccw
  point P0 (0, 0)
  dimension "d51" = 6.5
extrude "Extrusion11" cut sketch "Skizze13" against normal blind 3 contours L1 A0 L2 A1 | A6 L6 | L6 A6 L7 A7 L8
ref_plane "Arbeitsebene6" through (3.45, 21, 15.15) normal (1, 0, 0) x (0, 0, -1)
sketch "Skizze14" plane through (3.45, 21, 15.15) normal (1, 0, 0) x (0, 0, -1)
  line L0 (16, 16) -> (14, 16) projected
  line L1 (16, -16) -> (16, 16) projected
  line L2 (-16, 16) -> (-16, -16) projected
  circle A0 centre (-17.5, 10) radius 1 construction
  circle A1 centre (-11, -10.5) radius 1 construction
  line L3 (9.4, -16) -> (6.6, -16) projected
  circle A2 centre (10.5, 5) radius 1 construction
  circle A3 centre (0, 0) radius 6 projected
  line L4 (-48.75, -21) -> (-48.75, -11) projected
  line L5 (16, 16) -> (-48.75, 16)
  line L6 (-48.75, 16) -> (-48.75, -16)
  line L7 (-48.75, -16) -> (16, -16)
  line L8 (16, -16) -> (16, 16)
  circle A4 centre (-17.5, 10) radius 0.9
  circle A5 centre (10.5, 5) radius 0.85
  circle A6 centre (-11, -10.5) radius 0.85
  point P0 (15.15, -21)
  point P1 (9.4, -16)
  point P2 (16, -16)
  point P3 (14, 16)
  point P4 (-48.75, -11)
  point P5 (6.6, -16)
  dimension "d56" = 1.8
  dimension "d57" = 1.7
  dimension "d58" = 1.7
ref_plane "Arbeitsebene7" through (7.45, -0.1921, -3.518) normal (-1, 0, 0) x (0, -0.417504, 0.9086751)
extrude "Extrusion12" add sketch "Skizze14" along normal up to surface (4 mm away)
sketch "Skizze15" plane through (-37.75, 10, -63.9) normal (0, 1, 0) x (1, 0, 0)
  line L0 (-5, -48.05) -> (45.2, -48.05) projected
  line L1 (45.2, -48.05) -> (45.2, -63.05) projected
  line L2 (45.2, -63.05) -> (45.2, -89.3626) projected
  line L3 (45.2, -89.3626) -> (45.2, -90.7374) projected
  line L4 (45.2, -90.7374) -> (45.2, -127.8) projected
  line L5 (45.2, -127.8) -> (75.5, -127.8) projected
  arc A0 (75.5, -127.8) -> (80.5, -122.8) centre (75.5, -122.8) ccw projected
  line L6 (80.5, -122.8) -> (80.5, -5) projected
  arc A1 (80.5, -5) -> (75.5, 0) centre (75.5, -5) ccw projected
  line L7 (75.5, 0) -> (0, 0) projected
  arc A2 (0, 0) -> (-5, -5) centre (0, -5) ccw projected
  line L8 (-5, -5) -> (-5, -48.05) projected
  line L9 (80.5, -117.8) -> (52.5869, -117.8)
  line L10 (52.5869, -117.8) -> (52.5869, -15)
  line L11 (52.5869, -15) -> (80.5, -15)
  line L12 (80.5, -15) -> (80.5, -117.8)
  line L13 (45.7, -42.1725) -> (45.7, -1.05)
  point P0 (37.75, -63.9)
  point P1 (80.5, -15)
  dimension "d59" = 10
  dimension "d60" = 15
extrude "Extrusion13" cut sketch "Skizze15" against normal through all contours L6 L9 L10 L11
sketch "Skizze16" plane through (7.45, 10, -0.85) normal (1, 0, 0) x (0, 0, -1)
  circle A0 centre (-27, 0.5) radius 1 projected
  circle A1 centre (-27, 0.5) radius 0.85 projected
  circle A2 centre (-27, 0.5) radius 3.8399
  point P0 (-0.85, -10)
extrude "Extrusion14" cut sketch "Skizze16" along normal up to surface (7.3869 mm away) contours A0 | A1 | A2
chamfer "Fase1" distance 10 angle 45 1 edges at (14.8369, 0, 2.5)
sketch "Skizze17" plane through (-42.75, 5, -15.85) normal (0, 1, 0) x (1, 0, 0)
  line L0 (46.2, -79.75) -> (46.2, -15) projected
  line L1 (46.2, -15) -> (50.2, -15) projected
  line L2 (50.2, -15) -> (50.2, 0) projected
  line L3 (50.2, 0) -> (0, 0) projected
  line L4 (0, -74.75) -> (0, 0) projected
  arc A0 (0, -74.75) -> (5, -79.75) centre (5, -74.75) ccw projected
  line L5 (46.2, -79.75) -> (5, -79.75) projected
  line L6 (3.2, -29.4) -> (31.2, -29.4) projected
  arc A1 (31.2, -32.6) -> (31.2, -29.4) centre (31.2, -31) ccw projected
  line L7 (31.2, -32.6) -> (3.2, -32.6) projected
  arc A2 (3.2, -29.4) -> (3.2, -32.6) centre (3.2, -31) ccw projected
  line L8 (5, -74.75) -> (40, -74.75)
  line L9 (40, -74.75) -> (40, -7.75)
  line L10 (40, -7.75) -> (5, -7.75)
  line L11 (5, -7.75) -> (5, -74.75)
  point P0 (42.75, -15.85)
  dimension "d68" = 35
  dimension "d69" = 67
hole "Bohrung3" at (-37.75, 5, -8.1) at (-2.75, 5, -8.1) at (-2.75, 5, 58.9) at (-37.75, 5, 58.9) direction (0, -1, 0) diameter 3.8 end through all
sketch "Skizze18" plane through (3.45, 37, 63.9) normal (0, 1, 0) x (1, 0, 0)
  line L0 (4, 64.75) -> (4, 0) projected
  line L1 (0, 64.75) -> (4, 64.75) projected
  line L2 (0, 64.75) -> (0, 0) projected
  line L3 (0, 0) -> (4, 0) projected
  line L4 (-46.2, 5) -> (-46.2, 79.75) projected
  line L5 (0, 16.8478) -> (-46.2, 16.8478)
  line L6 (-46.2, 16.8478) -> (-46.2, 20.8478)
  line L7 (-46.2, 20.8478) -> (0, 20.8478)
  line L8 (0, 20.8478) -> (0, 16.8478)
  point P0 (-3.45, 63.9)
  point P1 (0, 20.8478)
  point P2 (-46.2, 16.8478)
  dimension "d77" = 4
extrude "Extrusion15" add sketch "Skizze18" against normal up to surface (32 mm away) contours L2 L5 L4 L7
properties part number "TIRFImager_base_xyz_v0"
